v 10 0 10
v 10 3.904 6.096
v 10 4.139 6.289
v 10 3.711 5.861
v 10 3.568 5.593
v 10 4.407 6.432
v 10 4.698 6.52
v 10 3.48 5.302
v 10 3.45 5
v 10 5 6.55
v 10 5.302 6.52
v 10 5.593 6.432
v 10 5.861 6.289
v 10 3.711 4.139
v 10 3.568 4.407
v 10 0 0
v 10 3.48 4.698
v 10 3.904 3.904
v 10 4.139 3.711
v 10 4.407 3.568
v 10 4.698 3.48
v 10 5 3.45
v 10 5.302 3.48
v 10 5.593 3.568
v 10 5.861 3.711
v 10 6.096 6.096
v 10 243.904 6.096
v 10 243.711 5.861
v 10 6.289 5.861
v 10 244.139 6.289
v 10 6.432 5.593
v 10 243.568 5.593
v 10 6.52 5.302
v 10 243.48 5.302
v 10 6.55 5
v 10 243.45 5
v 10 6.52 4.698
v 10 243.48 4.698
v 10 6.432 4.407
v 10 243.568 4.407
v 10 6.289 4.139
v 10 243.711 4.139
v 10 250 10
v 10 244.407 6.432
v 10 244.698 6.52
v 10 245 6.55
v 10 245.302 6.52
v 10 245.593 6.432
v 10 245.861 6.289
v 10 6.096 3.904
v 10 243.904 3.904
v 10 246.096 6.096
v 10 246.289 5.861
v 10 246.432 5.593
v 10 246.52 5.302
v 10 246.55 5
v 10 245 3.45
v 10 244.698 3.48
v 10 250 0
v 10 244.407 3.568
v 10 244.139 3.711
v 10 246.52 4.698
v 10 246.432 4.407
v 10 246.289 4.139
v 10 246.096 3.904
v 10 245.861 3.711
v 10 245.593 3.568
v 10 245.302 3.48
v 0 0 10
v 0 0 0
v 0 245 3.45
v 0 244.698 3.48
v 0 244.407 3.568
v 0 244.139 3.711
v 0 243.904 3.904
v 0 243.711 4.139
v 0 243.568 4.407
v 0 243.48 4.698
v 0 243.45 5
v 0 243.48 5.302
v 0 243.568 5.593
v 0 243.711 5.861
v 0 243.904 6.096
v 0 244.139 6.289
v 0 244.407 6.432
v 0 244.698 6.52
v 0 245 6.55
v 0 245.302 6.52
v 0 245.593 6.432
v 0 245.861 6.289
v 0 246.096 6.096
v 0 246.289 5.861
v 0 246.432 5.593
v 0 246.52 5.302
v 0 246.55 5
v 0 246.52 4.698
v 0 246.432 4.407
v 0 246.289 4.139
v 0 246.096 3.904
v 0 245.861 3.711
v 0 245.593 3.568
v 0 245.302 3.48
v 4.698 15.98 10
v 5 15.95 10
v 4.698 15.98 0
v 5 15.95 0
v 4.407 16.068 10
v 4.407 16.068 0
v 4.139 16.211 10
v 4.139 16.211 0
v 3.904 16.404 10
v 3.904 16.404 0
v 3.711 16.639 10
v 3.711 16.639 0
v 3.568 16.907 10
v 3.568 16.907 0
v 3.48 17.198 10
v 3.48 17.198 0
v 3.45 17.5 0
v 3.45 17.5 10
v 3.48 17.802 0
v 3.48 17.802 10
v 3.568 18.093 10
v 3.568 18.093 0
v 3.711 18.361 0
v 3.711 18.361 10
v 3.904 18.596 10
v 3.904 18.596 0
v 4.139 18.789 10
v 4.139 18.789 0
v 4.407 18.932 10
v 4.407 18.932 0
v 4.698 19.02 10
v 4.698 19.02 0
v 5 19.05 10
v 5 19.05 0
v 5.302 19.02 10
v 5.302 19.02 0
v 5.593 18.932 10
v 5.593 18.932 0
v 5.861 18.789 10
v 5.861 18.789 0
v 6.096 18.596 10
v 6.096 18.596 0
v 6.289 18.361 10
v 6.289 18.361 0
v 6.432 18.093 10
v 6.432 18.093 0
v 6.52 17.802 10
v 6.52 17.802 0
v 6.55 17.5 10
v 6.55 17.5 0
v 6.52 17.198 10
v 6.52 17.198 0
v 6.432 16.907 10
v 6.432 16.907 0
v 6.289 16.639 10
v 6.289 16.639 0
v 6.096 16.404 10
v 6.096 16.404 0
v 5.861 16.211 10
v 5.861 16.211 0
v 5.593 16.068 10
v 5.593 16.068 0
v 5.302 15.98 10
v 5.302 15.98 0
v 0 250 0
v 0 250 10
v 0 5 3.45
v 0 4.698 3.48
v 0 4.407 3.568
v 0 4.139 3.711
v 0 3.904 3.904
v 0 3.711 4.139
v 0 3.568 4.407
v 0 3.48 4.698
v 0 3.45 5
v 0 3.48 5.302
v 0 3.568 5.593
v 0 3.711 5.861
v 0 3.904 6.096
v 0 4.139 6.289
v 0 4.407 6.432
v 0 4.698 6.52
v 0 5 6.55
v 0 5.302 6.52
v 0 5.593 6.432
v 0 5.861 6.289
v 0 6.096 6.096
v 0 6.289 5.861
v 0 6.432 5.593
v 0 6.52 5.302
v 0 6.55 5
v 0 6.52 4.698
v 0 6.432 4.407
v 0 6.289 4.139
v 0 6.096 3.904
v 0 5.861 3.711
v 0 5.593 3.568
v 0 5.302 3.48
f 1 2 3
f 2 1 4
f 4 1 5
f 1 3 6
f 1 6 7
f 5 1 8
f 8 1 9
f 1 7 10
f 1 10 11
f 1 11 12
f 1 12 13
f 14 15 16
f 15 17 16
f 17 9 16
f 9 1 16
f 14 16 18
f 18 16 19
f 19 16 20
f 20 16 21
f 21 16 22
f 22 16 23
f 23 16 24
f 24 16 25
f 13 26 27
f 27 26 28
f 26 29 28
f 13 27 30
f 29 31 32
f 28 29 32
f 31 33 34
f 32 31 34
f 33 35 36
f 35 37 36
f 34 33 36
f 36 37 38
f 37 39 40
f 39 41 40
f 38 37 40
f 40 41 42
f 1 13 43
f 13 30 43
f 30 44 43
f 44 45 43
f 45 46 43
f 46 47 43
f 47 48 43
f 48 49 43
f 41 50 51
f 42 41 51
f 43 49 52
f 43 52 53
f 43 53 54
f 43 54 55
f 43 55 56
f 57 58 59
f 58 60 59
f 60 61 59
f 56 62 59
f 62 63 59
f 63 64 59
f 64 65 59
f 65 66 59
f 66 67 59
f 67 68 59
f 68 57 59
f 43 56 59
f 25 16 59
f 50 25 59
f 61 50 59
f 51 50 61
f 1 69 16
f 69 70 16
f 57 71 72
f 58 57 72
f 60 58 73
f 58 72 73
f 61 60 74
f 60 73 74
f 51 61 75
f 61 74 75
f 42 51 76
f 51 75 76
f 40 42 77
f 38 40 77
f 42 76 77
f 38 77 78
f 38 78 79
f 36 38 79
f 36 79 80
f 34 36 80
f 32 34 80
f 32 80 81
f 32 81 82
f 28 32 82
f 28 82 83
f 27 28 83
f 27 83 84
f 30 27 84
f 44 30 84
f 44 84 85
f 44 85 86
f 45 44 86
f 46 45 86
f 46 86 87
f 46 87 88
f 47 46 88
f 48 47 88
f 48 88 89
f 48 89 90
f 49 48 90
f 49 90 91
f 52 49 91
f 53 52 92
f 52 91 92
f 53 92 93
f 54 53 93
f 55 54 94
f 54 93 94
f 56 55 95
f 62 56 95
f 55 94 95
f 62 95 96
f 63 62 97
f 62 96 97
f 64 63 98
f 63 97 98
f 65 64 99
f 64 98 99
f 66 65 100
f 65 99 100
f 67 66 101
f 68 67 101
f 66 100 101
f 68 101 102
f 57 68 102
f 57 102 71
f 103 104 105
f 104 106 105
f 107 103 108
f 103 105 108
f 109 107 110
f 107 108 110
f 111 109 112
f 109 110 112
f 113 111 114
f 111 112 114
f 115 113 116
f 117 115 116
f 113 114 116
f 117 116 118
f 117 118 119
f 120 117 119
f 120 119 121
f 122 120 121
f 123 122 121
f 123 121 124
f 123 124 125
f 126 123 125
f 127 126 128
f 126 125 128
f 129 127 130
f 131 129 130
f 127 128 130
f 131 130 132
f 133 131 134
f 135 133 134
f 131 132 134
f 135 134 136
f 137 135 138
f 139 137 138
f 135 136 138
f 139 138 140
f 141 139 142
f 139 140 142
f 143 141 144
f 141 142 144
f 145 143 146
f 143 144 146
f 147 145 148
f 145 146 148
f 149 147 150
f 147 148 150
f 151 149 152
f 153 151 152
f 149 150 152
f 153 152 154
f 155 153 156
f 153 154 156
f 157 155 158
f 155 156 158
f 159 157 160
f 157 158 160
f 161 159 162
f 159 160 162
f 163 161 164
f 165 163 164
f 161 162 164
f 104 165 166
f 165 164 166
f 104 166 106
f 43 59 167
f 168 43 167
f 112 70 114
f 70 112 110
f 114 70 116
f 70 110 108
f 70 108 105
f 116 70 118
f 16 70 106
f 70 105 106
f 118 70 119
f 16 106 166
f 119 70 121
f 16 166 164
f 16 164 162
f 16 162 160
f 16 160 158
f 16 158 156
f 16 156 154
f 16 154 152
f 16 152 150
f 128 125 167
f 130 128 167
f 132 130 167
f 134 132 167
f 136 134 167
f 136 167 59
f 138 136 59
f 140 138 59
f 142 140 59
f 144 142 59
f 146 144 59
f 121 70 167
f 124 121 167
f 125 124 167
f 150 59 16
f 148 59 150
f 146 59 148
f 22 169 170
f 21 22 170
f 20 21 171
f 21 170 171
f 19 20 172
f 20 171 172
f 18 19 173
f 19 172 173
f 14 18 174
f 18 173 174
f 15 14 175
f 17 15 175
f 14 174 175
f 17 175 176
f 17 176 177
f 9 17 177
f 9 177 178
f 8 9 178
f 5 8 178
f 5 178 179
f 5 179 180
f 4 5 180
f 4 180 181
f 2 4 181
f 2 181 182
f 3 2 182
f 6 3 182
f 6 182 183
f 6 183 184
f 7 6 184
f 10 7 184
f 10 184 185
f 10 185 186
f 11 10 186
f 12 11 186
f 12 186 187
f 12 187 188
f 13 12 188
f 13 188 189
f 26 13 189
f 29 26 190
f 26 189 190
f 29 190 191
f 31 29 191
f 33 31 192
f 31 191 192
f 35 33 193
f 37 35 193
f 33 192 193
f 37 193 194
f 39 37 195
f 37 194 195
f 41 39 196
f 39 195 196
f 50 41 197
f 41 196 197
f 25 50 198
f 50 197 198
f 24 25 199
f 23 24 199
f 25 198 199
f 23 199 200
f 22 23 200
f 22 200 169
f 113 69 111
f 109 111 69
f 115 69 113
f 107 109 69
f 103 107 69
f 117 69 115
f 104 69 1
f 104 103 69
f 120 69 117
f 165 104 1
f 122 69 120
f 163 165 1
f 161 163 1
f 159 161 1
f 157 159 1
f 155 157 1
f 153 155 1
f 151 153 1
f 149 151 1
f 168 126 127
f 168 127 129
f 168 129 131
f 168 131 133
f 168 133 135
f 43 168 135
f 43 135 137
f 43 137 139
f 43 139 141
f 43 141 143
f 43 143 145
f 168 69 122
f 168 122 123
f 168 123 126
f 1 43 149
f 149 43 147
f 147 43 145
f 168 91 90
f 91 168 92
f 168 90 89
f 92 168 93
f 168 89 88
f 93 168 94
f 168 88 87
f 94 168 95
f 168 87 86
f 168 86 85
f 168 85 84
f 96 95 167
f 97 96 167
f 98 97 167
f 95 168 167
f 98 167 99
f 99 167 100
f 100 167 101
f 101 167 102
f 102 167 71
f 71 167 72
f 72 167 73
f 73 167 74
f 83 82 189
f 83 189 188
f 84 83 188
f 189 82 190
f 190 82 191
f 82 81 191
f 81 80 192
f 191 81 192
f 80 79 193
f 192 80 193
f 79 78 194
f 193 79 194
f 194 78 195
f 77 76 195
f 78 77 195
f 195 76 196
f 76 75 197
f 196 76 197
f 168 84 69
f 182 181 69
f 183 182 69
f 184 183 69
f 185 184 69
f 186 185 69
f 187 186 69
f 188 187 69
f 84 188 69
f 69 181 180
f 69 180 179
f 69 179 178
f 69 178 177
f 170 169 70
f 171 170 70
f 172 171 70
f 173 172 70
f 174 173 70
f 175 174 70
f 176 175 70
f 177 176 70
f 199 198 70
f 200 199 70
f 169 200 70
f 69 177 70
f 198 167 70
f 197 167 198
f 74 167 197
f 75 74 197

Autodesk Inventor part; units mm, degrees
ref_plane "YZ Plane" through (0, 0, 0) normal (1, 0, 0) x (0, 1, 0)
ref_plane "XZ Plane" through (0, 0, 0) normal (0, 1, 0) x (-1, 0, 0)
ref_plane "XY Plane" through (0, 0, 0) normal (0, 0, 1) x (1, 0, 0)
sketch "スケッチ1" plane through (0, 0, 0) normal (0, 0, 1) x (1, 0, 0)
  line L0 (0, 0) -> (10, 0)
  line L1 (10, 0) -> (10, 250)
  line L2 (10, 250) -> (0, 250)
  line L3 (0, 250) -> (0, 0)
  dimension "d0" = 10
  dimension "d1" = 250
extrude "押し出し1" add sketch "スケッチ1" along normal blind 10
sketch "スケッチ2" plane through (10, 0, 0) normal (1, 0, 0) x (0, 0, -1)
  line L0 (0, 0) -> (-10, 0) projected
  line L1 (0, 250) -> (-10, 250) projected
  point P0 (-5, 5)
  point P1 (-5, 245)
  point P2 (-5, 0)
  point P3 (-5, 0)
  point P4 (-5, 0)
  point P5 (-5, 250)
  dimension "d4" = 5
  dimension "d5" = 5
hole "穴1" at (10, 5, 5) at (10, 245, 5) direction (-1, 0, 0) diameter 3.1 end through all
sketch "スケッチ3" plane through (0, 0, 10) normal (0, 0, 1) x (1, 0, 0)
  line L0 (0, 0) -> (10, 0) projected
  point P0 (5, 17.5)
  point P1 (5, 0)
  point P2 (5, 0)
  dimension "d13" = 17.5
hole "穴2" at (5, 17.5, 10) direction (0, 0, -1) diameter 3.1 end through all
properties part number "Tate"
